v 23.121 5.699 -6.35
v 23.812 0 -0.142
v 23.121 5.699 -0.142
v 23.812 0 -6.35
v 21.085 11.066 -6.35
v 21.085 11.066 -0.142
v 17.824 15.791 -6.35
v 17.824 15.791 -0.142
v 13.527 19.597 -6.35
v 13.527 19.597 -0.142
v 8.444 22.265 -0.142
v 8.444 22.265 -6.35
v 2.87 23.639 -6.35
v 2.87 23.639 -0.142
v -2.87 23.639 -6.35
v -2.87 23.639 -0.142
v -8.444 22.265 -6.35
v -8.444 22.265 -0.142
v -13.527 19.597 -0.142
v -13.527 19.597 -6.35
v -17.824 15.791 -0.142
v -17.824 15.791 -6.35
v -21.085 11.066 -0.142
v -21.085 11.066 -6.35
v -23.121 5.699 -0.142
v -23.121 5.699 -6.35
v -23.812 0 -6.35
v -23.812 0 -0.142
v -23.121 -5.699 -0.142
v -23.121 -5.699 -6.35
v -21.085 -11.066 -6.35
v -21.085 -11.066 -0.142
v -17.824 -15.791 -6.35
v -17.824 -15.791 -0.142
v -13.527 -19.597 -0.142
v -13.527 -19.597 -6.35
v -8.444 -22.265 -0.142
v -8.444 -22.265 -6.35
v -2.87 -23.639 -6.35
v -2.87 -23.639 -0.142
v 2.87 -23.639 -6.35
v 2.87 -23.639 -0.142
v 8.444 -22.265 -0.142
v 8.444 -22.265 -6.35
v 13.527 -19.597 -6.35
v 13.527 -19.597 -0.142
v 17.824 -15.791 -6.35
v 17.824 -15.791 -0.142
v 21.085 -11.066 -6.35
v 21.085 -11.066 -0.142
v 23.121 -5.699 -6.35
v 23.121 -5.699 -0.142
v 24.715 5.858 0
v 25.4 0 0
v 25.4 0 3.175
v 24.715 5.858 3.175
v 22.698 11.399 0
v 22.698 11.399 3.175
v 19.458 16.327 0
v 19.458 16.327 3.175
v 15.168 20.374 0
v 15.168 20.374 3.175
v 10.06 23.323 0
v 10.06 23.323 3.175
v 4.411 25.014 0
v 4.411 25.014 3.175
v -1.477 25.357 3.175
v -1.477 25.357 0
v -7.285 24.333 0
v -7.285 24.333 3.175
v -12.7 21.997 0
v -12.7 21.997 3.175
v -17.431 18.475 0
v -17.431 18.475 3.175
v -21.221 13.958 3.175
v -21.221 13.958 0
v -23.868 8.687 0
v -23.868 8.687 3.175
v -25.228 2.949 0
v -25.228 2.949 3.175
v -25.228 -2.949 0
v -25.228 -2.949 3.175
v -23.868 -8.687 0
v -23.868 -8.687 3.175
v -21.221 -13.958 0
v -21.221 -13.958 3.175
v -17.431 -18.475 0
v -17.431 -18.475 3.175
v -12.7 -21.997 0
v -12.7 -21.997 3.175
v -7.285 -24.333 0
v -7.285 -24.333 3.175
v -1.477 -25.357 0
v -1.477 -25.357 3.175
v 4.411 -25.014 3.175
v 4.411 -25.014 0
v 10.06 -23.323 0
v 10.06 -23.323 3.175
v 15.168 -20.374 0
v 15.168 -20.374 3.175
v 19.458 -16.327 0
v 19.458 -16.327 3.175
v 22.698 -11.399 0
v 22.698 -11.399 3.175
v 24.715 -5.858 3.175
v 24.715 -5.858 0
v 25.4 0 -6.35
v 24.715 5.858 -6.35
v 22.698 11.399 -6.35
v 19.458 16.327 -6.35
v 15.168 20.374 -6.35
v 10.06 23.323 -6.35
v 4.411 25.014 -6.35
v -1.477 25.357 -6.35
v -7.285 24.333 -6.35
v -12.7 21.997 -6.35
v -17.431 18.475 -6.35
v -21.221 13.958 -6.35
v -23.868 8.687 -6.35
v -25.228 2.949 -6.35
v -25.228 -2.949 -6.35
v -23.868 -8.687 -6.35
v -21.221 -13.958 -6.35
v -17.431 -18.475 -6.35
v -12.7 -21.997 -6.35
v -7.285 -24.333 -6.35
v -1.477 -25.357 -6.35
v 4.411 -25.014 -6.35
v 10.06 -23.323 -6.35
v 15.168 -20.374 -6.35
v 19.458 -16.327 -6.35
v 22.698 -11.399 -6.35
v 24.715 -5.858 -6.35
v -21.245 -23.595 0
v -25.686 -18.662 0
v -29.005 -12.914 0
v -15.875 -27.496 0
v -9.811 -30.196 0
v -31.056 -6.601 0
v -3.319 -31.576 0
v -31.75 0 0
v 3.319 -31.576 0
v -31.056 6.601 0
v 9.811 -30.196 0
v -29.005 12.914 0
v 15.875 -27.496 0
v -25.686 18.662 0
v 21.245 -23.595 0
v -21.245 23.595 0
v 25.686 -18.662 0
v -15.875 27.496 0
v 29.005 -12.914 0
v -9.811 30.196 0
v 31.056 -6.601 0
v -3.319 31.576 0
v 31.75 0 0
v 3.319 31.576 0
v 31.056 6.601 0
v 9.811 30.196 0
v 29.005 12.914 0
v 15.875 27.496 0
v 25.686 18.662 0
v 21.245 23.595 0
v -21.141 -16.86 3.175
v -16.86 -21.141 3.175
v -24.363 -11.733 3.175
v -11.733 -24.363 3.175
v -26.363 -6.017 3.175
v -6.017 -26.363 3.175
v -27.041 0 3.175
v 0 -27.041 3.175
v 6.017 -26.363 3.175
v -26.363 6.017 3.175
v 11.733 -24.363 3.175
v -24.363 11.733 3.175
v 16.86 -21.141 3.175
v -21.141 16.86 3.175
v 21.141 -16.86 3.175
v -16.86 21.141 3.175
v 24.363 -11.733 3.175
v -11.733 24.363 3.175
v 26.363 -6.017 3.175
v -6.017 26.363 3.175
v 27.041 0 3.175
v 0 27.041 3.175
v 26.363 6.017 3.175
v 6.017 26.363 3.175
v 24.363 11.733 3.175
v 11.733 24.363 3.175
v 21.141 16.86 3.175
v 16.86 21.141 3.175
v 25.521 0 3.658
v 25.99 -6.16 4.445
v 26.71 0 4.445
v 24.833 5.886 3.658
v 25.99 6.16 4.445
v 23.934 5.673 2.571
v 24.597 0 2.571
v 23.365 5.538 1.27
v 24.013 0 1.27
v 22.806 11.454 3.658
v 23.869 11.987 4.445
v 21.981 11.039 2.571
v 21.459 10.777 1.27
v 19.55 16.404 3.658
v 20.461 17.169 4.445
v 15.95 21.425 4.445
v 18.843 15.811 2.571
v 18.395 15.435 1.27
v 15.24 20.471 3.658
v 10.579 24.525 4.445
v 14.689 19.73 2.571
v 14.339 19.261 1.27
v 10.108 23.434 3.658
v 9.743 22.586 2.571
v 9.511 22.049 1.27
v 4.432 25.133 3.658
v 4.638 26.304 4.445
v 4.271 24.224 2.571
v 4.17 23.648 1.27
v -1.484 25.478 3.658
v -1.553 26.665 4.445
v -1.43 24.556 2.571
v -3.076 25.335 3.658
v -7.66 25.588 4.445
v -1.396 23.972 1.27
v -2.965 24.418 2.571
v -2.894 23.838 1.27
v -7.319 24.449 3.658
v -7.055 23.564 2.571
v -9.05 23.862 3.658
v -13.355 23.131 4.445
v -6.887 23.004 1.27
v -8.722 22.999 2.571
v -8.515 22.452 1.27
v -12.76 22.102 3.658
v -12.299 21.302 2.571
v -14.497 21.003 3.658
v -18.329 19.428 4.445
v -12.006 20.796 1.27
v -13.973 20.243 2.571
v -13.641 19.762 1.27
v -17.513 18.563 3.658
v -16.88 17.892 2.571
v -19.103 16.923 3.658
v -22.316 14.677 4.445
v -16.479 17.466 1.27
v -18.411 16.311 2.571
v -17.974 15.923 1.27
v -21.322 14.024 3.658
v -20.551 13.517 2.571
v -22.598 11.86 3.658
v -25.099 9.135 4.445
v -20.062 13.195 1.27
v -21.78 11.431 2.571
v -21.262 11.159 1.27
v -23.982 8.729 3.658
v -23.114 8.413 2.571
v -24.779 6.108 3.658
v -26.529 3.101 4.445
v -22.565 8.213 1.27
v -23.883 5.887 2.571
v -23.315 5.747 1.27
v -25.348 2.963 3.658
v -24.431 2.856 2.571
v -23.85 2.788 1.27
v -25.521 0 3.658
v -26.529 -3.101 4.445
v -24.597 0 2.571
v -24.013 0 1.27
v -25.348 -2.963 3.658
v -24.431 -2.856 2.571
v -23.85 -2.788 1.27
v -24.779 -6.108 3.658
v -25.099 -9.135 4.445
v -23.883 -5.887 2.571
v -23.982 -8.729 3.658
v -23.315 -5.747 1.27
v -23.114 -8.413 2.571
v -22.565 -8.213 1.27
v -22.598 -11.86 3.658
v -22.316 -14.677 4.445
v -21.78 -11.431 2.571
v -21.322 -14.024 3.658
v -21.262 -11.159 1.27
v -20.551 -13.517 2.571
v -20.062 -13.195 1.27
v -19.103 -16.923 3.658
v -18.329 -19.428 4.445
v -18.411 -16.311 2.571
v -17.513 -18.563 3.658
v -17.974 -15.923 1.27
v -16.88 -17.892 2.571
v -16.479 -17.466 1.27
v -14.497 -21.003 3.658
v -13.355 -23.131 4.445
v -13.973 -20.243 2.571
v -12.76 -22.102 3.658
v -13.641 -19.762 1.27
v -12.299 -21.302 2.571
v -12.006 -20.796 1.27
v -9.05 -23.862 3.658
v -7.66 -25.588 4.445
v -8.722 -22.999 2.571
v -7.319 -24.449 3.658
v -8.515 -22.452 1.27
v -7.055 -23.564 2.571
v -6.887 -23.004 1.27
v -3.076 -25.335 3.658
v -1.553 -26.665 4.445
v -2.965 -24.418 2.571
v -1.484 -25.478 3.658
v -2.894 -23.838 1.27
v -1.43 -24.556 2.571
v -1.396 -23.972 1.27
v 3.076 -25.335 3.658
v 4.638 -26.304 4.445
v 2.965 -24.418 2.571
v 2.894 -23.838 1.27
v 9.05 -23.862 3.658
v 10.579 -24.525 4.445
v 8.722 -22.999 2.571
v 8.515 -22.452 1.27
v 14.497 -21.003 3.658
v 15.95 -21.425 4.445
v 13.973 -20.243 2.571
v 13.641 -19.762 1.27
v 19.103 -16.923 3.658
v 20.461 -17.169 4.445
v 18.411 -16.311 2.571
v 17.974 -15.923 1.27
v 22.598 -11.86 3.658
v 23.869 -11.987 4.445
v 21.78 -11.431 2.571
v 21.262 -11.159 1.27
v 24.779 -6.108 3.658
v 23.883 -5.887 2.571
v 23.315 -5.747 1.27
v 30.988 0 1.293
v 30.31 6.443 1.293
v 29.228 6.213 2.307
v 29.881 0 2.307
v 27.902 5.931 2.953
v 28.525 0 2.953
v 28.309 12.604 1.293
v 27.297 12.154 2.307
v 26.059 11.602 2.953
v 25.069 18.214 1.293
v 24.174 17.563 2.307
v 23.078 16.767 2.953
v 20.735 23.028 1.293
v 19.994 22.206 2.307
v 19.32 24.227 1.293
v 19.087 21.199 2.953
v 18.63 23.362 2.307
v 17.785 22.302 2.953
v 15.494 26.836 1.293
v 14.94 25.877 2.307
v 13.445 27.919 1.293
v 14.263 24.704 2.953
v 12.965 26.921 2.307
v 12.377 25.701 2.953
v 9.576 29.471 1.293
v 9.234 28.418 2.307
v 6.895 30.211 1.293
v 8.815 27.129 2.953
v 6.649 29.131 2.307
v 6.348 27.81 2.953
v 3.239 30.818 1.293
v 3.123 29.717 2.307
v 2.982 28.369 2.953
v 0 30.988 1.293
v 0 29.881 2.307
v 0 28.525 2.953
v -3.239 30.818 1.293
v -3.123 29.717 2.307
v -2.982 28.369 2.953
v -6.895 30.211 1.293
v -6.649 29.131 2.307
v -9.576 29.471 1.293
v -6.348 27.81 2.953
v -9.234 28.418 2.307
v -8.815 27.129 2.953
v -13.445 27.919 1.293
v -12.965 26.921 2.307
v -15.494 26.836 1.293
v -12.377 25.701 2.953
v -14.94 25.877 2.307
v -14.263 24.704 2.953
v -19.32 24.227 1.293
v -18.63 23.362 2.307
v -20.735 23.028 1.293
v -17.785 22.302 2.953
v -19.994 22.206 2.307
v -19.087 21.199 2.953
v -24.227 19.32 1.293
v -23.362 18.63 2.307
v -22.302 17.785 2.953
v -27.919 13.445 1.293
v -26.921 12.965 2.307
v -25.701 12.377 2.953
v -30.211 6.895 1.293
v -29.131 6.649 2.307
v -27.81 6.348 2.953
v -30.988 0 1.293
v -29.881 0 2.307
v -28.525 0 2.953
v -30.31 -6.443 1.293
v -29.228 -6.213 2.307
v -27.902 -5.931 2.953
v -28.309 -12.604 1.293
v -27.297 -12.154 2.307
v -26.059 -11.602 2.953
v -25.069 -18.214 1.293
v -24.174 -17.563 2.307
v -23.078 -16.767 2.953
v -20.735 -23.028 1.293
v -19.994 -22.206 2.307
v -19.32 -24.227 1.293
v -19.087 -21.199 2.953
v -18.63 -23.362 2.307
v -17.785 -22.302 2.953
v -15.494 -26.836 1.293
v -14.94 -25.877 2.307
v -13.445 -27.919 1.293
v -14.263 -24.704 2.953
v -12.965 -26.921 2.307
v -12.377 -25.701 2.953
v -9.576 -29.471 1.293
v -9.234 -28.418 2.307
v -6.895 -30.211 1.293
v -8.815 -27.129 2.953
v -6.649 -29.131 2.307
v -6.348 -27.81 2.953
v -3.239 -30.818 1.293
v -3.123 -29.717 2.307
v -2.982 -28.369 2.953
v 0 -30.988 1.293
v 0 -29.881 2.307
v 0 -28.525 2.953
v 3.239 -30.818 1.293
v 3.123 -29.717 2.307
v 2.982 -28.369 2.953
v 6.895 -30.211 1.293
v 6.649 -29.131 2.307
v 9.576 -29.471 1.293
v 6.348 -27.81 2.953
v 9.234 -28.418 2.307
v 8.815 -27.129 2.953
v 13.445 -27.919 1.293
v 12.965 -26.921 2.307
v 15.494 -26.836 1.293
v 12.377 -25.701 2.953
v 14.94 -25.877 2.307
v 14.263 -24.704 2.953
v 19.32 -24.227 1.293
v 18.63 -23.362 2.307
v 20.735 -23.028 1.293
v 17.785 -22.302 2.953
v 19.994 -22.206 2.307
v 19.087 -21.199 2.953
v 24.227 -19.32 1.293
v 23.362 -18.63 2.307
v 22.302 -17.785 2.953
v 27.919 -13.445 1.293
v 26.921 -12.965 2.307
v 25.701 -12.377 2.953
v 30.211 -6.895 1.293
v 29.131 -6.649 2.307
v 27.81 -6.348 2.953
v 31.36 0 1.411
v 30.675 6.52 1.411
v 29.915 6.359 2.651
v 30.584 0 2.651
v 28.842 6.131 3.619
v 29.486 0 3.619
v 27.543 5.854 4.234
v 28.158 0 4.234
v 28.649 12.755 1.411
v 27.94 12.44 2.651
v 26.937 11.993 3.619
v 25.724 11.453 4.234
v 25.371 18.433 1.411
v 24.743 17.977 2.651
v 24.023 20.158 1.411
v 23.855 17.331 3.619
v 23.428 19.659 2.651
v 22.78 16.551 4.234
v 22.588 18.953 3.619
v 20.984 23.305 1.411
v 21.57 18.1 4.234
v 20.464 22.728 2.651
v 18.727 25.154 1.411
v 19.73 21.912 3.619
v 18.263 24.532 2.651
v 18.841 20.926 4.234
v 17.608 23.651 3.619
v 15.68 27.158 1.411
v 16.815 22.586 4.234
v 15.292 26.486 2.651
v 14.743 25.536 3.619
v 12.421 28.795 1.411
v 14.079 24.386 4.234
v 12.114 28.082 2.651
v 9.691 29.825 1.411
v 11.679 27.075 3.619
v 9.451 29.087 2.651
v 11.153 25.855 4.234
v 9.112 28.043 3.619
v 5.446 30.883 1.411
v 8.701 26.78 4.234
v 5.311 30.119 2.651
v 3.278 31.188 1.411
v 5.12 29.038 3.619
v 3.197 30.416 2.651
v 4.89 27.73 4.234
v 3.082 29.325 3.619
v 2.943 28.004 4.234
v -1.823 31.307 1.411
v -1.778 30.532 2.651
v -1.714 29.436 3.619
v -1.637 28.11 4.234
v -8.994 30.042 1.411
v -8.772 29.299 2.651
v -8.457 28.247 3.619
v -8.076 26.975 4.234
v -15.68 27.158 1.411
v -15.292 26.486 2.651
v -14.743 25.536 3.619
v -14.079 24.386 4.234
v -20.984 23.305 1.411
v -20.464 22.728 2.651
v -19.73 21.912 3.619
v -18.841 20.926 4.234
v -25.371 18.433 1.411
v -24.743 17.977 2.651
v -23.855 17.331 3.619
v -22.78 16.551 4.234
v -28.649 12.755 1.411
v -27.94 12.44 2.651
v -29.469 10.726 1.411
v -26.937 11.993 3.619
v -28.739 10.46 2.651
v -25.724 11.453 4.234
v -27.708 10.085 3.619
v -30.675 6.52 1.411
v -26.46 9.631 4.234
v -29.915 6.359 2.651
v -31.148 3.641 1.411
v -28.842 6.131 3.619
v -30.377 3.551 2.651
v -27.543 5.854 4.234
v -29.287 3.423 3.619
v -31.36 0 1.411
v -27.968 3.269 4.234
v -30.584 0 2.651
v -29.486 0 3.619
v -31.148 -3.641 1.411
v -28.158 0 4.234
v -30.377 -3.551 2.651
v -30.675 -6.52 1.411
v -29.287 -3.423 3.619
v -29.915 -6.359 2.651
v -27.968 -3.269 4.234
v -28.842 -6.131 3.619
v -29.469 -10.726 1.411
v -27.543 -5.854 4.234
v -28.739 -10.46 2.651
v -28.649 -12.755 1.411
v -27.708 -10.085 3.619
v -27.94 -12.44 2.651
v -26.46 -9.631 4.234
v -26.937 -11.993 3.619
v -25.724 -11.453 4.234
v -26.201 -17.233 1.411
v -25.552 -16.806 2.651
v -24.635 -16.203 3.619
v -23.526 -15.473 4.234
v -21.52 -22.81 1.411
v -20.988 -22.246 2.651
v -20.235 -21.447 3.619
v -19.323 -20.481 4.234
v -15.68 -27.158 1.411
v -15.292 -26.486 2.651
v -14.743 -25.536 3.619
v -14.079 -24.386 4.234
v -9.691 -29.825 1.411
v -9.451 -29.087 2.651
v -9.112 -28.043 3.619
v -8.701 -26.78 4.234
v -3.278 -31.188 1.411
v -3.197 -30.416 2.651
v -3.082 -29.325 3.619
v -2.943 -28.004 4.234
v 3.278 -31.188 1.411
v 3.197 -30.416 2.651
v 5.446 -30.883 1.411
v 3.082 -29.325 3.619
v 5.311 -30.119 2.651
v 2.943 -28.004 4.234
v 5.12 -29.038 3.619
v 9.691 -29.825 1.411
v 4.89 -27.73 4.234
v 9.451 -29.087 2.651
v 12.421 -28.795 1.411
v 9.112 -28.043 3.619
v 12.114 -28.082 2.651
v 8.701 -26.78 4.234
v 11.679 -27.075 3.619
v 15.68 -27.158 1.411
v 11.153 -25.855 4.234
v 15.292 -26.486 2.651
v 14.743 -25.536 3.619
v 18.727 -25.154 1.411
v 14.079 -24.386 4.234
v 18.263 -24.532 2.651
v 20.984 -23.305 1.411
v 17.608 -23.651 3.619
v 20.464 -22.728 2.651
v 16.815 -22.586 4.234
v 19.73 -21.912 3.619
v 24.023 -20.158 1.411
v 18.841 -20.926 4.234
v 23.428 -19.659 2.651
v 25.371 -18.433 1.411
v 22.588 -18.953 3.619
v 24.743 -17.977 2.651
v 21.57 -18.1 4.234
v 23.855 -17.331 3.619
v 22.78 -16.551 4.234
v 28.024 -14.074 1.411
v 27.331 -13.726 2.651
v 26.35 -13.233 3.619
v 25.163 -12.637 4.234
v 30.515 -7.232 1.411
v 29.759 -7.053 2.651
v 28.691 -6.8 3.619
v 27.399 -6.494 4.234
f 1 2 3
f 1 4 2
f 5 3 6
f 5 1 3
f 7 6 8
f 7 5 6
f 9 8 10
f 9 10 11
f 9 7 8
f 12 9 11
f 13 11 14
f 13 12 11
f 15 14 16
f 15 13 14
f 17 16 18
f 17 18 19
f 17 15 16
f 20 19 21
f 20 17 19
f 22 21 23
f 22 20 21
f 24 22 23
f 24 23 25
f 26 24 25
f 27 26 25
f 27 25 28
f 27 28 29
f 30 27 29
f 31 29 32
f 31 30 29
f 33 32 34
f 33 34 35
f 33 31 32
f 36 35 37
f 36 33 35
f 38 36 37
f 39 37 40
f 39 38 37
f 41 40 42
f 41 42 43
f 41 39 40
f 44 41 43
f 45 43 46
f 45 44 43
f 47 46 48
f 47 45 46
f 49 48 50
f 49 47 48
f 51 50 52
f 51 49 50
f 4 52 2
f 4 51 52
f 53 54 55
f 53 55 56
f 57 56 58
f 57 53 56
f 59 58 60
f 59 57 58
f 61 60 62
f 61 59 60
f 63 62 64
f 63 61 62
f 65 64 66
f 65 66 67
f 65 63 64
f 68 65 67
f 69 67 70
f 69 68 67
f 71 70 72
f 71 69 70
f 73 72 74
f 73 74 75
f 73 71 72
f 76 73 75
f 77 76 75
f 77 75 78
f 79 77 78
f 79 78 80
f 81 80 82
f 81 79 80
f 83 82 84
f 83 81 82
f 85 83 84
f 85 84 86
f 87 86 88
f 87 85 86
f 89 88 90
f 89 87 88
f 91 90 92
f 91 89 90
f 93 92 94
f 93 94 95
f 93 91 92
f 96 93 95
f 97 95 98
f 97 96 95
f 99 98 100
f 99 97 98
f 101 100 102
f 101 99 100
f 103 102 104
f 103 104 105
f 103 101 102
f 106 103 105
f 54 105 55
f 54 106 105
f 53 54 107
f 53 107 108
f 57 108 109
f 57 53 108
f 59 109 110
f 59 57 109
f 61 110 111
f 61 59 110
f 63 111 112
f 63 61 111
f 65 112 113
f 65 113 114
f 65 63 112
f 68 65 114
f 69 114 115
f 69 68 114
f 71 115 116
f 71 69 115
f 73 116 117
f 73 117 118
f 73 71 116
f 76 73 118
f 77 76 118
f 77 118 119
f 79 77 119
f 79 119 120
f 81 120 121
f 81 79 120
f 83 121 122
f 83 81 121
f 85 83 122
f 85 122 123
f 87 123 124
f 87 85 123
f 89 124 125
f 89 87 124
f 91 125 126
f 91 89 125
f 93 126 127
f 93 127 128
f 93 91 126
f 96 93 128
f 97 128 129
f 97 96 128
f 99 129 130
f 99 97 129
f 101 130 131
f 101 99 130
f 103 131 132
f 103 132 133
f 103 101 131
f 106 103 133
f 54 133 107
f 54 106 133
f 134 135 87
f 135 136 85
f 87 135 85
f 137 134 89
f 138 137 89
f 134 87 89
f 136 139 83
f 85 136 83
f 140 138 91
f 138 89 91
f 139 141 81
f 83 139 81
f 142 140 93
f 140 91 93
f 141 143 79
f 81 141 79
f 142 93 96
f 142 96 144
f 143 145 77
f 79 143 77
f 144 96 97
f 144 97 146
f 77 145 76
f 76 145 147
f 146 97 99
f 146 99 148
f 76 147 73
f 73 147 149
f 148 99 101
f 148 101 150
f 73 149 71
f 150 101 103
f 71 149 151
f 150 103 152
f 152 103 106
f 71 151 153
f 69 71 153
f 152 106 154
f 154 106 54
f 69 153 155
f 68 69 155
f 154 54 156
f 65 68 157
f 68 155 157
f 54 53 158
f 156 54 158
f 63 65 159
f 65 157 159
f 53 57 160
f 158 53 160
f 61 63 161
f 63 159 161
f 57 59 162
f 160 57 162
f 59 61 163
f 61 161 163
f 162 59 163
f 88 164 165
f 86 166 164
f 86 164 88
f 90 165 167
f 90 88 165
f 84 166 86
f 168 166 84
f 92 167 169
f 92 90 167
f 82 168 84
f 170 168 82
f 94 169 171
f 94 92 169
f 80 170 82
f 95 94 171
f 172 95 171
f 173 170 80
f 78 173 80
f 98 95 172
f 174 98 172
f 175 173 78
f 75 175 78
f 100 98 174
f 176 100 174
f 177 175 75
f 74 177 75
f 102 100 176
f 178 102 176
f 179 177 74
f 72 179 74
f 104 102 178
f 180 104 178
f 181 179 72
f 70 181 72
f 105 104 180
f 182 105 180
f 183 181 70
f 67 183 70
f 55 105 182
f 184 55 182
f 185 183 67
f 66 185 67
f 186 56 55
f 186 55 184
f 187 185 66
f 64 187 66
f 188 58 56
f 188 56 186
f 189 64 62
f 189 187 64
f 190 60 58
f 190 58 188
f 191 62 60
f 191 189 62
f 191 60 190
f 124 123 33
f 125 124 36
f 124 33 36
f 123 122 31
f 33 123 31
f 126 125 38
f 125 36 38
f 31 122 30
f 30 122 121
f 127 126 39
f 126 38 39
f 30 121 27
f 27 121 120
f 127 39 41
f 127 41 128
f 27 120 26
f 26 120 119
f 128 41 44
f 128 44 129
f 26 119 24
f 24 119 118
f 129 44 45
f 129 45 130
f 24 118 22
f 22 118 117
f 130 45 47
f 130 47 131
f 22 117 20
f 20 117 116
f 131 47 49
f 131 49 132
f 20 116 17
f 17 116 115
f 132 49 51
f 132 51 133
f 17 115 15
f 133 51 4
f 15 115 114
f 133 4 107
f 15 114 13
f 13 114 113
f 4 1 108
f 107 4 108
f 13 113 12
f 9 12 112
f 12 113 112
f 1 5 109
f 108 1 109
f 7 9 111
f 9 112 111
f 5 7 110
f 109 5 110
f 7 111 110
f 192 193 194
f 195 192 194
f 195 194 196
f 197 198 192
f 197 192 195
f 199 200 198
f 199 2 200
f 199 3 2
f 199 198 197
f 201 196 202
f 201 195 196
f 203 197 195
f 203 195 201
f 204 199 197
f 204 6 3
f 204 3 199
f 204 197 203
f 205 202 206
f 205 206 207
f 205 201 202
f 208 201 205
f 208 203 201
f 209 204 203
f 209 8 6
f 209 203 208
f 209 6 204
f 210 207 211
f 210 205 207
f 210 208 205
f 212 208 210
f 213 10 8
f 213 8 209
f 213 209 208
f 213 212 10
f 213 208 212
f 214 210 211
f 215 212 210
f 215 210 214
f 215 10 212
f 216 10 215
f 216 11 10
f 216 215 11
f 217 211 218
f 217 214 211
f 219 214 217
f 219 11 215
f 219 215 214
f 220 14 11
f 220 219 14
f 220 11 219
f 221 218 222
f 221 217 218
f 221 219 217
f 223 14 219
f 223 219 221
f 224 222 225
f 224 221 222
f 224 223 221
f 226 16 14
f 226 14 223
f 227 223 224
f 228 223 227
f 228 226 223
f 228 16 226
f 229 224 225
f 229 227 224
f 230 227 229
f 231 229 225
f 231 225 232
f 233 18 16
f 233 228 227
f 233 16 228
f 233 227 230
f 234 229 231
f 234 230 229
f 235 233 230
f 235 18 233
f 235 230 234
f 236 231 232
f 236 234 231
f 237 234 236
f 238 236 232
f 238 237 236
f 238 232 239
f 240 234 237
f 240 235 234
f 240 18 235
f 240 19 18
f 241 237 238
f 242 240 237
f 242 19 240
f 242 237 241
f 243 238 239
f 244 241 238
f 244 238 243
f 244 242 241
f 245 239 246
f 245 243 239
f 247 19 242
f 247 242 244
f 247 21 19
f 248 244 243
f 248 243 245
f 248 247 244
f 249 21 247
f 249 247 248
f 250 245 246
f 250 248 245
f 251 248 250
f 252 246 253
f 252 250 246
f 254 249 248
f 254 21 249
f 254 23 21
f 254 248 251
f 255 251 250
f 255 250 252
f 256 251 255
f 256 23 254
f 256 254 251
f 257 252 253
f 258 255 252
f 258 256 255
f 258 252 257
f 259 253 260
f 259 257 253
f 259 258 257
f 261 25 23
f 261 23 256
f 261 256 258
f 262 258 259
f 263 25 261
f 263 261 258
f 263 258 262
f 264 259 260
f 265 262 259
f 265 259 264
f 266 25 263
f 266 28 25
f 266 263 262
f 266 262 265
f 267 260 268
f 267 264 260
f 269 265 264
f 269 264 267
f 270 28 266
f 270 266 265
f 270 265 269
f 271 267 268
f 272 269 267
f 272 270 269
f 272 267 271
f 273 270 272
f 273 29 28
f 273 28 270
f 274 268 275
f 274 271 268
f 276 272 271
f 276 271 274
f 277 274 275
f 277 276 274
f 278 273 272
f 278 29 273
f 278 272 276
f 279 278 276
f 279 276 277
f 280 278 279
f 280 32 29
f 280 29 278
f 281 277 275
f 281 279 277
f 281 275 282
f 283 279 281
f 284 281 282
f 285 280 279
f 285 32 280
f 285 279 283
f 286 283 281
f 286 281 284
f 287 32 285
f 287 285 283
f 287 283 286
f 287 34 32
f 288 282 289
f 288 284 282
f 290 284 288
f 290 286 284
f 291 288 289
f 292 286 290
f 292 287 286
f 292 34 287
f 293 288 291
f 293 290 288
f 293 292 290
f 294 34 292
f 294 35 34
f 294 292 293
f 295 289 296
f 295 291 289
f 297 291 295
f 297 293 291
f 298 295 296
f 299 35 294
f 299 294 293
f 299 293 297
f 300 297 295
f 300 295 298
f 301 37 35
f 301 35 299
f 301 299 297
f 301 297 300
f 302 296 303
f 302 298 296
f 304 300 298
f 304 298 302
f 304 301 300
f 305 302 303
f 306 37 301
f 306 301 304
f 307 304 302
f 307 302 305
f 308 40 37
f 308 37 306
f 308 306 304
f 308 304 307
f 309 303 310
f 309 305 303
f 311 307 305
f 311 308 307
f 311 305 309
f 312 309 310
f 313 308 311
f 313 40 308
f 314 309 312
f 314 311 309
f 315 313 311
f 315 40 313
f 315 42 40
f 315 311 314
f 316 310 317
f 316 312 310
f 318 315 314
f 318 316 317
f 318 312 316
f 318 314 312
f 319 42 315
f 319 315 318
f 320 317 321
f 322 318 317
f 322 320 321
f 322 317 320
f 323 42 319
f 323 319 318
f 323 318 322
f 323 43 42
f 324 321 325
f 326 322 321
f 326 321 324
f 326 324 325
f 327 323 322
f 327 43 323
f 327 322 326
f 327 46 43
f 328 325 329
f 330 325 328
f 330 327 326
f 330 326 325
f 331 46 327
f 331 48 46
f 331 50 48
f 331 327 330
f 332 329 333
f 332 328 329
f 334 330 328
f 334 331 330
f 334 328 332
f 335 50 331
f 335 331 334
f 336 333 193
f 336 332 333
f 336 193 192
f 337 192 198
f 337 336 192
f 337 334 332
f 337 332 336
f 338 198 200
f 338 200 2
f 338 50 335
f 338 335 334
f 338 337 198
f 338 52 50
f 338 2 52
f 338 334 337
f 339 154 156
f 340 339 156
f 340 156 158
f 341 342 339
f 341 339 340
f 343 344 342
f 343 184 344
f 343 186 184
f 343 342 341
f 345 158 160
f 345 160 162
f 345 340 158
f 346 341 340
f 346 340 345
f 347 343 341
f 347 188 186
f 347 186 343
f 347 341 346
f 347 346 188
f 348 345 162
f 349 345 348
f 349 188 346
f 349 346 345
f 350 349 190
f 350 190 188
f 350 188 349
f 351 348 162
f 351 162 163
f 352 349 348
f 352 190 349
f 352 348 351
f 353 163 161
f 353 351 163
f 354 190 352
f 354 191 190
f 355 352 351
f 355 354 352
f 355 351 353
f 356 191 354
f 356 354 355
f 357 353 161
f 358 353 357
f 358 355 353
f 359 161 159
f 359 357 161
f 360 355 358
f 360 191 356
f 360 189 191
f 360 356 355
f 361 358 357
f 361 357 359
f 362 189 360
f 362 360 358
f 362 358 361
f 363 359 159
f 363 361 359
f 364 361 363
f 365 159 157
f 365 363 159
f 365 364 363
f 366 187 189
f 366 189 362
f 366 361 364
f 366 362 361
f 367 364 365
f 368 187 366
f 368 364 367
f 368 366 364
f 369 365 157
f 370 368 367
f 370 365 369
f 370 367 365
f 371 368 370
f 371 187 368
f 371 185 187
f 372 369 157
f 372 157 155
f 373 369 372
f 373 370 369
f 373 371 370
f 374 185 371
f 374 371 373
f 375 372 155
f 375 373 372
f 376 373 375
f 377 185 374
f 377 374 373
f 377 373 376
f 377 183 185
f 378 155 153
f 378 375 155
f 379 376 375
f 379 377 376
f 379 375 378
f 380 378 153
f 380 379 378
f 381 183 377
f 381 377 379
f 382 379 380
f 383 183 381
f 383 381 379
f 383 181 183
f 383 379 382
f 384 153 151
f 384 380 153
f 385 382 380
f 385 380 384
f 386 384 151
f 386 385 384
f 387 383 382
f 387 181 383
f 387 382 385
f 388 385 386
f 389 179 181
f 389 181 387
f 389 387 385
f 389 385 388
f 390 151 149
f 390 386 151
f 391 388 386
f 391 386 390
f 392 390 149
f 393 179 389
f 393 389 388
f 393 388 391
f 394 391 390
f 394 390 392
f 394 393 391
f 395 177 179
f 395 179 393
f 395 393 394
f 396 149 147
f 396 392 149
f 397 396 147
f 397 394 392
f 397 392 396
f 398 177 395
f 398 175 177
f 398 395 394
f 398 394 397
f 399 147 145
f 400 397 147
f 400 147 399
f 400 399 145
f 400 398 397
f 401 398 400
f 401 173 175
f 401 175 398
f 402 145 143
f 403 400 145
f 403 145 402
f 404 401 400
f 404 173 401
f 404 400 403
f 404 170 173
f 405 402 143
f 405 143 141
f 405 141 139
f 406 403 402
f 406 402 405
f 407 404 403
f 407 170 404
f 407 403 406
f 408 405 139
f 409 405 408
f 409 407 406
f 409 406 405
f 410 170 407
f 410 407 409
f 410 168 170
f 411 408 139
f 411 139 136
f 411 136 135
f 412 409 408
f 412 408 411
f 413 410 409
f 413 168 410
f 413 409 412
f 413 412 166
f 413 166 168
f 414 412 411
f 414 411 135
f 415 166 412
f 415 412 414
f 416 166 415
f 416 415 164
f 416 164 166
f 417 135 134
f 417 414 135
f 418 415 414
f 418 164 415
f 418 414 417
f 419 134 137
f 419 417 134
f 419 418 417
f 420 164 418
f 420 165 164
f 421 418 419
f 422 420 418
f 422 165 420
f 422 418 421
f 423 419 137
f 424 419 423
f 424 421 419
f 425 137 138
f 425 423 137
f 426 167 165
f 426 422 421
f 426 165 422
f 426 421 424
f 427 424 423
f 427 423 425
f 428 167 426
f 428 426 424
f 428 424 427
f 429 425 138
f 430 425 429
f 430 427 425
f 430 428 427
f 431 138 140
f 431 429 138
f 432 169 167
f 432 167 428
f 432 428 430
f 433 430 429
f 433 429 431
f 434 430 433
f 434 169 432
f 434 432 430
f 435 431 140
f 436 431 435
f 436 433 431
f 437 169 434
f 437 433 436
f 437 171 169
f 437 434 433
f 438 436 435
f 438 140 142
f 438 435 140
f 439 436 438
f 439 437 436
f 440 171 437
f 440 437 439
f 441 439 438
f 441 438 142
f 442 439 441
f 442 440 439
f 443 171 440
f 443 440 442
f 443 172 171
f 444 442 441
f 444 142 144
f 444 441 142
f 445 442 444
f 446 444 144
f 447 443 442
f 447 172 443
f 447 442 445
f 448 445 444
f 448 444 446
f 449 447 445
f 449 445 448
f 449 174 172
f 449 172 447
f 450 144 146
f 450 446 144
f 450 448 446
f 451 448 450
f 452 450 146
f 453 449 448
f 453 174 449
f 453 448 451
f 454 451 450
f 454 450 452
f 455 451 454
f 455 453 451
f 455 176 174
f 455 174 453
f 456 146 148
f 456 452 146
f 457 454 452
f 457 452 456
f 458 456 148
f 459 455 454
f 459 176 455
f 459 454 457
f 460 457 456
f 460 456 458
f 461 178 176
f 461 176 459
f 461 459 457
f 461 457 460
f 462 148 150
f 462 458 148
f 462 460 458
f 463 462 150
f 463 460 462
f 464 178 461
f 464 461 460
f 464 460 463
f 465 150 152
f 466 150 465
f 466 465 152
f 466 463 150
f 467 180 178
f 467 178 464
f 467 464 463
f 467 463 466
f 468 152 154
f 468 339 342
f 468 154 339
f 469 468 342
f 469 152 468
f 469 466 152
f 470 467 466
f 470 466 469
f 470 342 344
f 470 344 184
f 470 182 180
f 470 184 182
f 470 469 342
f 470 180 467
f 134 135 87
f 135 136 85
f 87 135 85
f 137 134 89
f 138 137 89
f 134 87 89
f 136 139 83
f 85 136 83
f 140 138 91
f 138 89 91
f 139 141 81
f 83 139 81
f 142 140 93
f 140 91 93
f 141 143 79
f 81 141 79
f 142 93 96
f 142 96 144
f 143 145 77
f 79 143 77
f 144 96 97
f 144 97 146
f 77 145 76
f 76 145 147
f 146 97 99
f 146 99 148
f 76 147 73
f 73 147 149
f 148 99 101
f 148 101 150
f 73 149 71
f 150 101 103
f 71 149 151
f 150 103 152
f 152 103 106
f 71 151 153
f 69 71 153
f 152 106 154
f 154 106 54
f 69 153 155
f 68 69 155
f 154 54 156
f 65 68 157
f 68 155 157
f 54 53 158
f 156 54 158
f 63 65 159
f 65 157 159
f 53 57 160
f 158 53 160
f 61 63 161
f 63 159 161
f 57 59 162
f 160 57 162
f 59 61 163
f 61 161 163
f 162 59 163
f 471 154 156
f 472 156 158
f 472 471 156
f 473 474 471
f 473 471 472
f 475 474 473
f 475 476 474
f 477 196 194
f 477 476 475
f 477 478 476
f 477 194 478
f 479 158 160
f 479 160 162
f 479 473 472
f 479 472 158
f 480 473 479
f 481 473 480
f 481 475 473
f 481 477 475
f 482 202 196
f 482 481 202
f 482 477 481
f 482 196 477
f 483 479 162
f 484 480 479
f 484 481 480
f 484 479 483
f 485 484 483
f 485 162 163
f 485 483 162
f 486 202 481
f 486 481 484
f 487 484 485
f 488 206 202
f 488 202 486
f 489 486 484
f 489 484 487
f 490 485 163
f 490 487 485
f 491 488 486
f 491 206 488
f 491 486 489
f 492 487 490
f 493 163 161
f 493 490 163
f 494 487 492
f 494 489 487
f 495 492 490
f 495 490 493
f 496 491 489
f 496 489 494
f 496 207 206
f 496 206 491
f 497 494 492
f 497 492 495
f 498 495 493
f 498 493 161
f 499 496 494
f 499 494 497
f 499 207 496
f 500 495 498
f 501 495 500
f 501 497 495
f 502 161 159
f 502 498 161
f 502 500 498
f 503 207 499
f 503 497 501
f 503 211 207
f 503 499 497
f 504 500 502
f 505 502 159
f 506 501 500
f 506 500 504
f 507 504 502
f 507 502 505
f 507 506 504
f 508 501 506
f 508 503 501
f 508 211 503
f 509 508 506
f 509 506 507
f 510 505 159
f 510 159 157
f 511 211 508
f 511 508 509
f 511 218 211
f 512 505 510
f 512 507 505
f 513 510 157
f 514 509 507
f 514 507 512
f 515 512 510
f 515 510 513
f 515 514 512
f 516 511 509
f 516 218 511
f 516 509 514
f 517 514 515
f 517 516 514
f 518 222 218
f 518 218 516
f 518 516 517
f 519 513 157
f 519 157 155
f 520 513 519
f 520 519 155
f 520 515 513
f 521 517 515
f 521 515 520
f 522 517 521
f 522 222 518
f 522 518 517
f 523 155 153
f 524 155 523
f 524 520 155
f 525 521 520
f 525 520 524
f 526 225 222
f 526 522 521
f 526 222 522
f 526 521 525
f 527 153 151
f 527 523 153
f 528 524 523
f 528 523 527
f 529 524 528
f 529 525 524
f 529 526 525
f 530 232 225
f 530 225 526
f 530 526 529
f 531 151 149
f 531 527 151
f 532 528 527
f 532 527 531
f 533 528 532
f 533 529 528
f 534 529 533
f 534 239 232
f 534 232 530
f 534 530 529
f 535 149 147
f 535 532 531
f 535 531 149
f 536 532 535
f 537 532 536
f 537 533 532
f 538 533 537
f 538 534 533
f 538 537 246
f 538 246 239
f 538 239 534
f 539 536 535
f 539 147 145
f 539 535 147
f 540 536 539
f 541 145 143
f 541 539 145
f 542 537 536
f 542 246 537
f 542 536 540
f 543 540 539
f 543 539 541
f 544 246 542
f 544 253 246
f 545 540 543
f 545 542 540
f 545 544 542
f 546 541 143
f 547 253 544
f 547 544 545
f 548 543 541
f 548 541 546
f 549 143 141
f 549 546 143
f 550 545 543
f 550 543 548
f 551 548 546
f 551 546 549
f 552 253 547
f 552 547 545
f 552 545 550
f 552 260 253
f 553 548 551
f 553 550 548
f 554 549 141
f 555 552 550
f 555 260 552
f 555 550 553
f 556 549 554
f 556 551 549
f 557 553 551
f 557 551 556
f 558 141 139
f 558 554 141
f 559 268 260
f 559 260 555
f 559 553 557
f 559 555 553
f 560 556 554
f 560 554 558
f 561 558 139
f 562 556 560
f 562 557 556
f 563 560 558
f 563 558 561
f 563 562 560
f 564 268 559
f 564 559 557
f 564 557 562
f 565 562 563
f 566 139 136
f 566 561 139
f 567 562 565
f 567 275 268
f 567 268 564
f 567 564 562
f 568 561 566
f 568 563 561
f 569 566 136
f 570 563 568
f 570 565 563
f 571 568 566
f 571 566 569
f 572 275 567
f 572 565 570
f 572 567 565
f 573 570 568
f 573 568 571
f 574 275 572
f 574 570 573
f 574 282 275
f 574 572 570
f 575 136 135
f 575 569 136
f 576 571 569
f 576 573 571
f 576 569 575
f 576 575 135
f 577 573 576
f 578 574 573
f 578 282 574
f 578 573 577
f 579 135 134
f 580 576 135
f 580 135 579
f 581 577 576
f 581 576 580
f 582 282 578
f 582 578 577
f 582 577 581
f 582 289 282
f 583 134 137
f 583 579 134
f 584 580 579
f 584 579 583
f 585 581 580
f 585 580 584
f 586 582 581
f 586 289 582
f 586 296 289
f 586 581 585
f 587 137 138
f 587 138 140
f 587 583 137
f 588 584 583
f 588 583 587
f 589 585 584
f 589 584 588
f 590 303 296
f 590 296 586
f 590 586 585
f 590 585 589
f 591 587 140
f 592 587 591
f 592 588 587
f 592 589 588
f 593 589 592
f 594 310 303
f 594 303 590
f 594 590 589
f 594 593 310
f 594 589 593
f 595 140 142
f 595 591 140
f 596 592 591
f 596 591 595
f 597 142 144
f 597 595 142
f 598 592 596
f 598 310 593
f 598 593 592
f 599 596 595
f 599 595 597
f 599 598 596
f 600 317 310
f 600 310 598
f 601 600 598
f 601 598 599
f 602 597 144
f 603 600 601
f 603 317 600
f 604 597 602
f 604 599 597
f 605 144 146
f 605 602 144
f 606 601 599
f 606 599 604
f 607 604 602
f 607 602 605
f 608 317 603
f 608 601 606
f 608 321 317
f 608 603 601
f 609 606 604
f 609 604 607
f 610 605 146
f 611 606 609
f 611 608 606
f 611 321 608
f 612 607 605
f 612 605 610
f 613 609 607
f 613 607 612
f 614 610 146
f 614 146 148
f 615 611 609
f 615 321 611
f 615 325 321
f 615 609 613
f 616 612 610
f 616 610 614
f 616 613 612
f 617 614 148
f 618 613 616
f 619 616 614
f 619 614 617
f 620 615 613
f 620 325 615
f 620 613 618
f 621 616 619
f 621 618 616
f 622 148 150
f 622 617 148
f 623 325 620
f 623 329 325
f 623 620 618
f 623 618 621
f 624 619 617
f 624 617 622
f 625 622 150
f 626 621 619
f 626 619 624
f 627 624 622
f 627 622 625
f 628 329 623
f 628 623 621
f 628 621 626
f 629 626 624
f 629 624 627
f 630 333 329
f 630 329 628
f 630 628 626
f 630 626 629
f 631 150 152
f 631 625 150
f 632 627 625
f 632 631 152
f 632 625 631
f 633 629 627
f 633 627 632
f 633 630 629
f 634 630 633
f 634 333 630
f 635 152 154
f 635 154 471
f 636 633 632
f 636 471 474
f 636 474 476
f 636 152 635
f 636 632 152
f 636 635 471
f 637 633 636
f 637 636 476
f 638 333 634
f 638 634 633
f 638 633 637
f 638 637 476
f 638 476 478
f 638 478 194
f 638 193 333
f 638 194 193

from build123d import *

# Parameters (mm, degrees)
F0_R     = 25.4
F0_R_2   = 23.8125
F1_DEPTH = 6.35
F0_R_3   = 31.75
F2_DEPTH = 4.445
F5_DEPTH = 3.175


# Not quite as in the source:
# - a fillet or chamfer that OpenCascade refuses, or shapes differently, is made with other operations: its cross-section is extruded or revolved along the edge and cut away or added


with BuildPart() as f1:
    # F0 (on Top) → F1 (new body)
    with BuildSketch(Plane.XY):
        Circle(F0_R)
        Circle(F0_R_2, mode=Mode.SUBTRACT)
    extrude(amount=-F1_DEPTH)

    # F0 (on Top) → F2 (join)
    with BuildSketch(Plane.XY):
        Circle(F0_R_3)
        Circle(F0_R, mode=Mode.SUBTRACT)
        Circle(F0_R)
        Circle(F0_R_2, mode=Mode.SUBTRACT)
    extrude(amount=F2_DEPTH)

    # F3: fillet of radius 5.08 on 1 edges, made by hand

    # F3_s1 → F3_t2 (revolve, cut)
    with BuildSketch(Plane.XZ):
        with BuildLine():
            ThreePointArc((31.75, 0), (30.0699479175, 3.175), (26.7098437524, 4.445))
            Line((26.7098437524, 4.445), (31.75, 4.445))
            Line((31.75, 4.445), (31.75, 0))
        make_face()
    revolve(axis=Axis((0, 0, 4.445), (0, 0, 1)), mode=Mode.SUBTRACT)

    # F4: fillet of radius 5.08 on 1 edges, made by hand

    # F4_s1 → F4_t2 (revolve, cut)
    with BuildSketch(Plane.XZ):
        with BuildLine():
            ThreePointArc((26.7098437524, 4.445), (24.5974858127, 2.5705934827), (23.8125, -0.1422008573))
            Line((23.8125, -0.1422008573), (23.8125, 4.445))
            Line((23.8125, 4.445), (26.7098437524, 4.445))
        make_face()
    revolve(axis=Axis((0, 0, 4.445), (0, 0, 1)), mode=Mode.SUBTRACT)


with BuildPart() as f5:
    # F0 (on Top) → F5 (new body)
    with BuildSketch(Plane.XY):
        Circle(F0_R_3)
        Circle(F0_R, mode=Mode.SUBTRACT)
    extrude(amount=F5_DEPTH)

    # F6: fillet of radius 5.08 on 1 edges, made by hand

    # F6_s1 → F6_t2 (revolve, cut)
    with BuildSketch(Plane.XZ):
        with BuildLine():
            ThreePointArc((31.75, 0), (29.8805202921, 2.3071134838), (27.0407139607, 3.175))
            Line((27.0407139607, 3.175), (31.75, 3.175))
            Line((31.75, 3.175), (31.75, 0))
        make_face()
    revolve(axis=Axis((0, 0, 3.175), (0, 0, 1)), mode=Mode.SUBTRACT)


solid = Compound([f1.part, f5.part])
